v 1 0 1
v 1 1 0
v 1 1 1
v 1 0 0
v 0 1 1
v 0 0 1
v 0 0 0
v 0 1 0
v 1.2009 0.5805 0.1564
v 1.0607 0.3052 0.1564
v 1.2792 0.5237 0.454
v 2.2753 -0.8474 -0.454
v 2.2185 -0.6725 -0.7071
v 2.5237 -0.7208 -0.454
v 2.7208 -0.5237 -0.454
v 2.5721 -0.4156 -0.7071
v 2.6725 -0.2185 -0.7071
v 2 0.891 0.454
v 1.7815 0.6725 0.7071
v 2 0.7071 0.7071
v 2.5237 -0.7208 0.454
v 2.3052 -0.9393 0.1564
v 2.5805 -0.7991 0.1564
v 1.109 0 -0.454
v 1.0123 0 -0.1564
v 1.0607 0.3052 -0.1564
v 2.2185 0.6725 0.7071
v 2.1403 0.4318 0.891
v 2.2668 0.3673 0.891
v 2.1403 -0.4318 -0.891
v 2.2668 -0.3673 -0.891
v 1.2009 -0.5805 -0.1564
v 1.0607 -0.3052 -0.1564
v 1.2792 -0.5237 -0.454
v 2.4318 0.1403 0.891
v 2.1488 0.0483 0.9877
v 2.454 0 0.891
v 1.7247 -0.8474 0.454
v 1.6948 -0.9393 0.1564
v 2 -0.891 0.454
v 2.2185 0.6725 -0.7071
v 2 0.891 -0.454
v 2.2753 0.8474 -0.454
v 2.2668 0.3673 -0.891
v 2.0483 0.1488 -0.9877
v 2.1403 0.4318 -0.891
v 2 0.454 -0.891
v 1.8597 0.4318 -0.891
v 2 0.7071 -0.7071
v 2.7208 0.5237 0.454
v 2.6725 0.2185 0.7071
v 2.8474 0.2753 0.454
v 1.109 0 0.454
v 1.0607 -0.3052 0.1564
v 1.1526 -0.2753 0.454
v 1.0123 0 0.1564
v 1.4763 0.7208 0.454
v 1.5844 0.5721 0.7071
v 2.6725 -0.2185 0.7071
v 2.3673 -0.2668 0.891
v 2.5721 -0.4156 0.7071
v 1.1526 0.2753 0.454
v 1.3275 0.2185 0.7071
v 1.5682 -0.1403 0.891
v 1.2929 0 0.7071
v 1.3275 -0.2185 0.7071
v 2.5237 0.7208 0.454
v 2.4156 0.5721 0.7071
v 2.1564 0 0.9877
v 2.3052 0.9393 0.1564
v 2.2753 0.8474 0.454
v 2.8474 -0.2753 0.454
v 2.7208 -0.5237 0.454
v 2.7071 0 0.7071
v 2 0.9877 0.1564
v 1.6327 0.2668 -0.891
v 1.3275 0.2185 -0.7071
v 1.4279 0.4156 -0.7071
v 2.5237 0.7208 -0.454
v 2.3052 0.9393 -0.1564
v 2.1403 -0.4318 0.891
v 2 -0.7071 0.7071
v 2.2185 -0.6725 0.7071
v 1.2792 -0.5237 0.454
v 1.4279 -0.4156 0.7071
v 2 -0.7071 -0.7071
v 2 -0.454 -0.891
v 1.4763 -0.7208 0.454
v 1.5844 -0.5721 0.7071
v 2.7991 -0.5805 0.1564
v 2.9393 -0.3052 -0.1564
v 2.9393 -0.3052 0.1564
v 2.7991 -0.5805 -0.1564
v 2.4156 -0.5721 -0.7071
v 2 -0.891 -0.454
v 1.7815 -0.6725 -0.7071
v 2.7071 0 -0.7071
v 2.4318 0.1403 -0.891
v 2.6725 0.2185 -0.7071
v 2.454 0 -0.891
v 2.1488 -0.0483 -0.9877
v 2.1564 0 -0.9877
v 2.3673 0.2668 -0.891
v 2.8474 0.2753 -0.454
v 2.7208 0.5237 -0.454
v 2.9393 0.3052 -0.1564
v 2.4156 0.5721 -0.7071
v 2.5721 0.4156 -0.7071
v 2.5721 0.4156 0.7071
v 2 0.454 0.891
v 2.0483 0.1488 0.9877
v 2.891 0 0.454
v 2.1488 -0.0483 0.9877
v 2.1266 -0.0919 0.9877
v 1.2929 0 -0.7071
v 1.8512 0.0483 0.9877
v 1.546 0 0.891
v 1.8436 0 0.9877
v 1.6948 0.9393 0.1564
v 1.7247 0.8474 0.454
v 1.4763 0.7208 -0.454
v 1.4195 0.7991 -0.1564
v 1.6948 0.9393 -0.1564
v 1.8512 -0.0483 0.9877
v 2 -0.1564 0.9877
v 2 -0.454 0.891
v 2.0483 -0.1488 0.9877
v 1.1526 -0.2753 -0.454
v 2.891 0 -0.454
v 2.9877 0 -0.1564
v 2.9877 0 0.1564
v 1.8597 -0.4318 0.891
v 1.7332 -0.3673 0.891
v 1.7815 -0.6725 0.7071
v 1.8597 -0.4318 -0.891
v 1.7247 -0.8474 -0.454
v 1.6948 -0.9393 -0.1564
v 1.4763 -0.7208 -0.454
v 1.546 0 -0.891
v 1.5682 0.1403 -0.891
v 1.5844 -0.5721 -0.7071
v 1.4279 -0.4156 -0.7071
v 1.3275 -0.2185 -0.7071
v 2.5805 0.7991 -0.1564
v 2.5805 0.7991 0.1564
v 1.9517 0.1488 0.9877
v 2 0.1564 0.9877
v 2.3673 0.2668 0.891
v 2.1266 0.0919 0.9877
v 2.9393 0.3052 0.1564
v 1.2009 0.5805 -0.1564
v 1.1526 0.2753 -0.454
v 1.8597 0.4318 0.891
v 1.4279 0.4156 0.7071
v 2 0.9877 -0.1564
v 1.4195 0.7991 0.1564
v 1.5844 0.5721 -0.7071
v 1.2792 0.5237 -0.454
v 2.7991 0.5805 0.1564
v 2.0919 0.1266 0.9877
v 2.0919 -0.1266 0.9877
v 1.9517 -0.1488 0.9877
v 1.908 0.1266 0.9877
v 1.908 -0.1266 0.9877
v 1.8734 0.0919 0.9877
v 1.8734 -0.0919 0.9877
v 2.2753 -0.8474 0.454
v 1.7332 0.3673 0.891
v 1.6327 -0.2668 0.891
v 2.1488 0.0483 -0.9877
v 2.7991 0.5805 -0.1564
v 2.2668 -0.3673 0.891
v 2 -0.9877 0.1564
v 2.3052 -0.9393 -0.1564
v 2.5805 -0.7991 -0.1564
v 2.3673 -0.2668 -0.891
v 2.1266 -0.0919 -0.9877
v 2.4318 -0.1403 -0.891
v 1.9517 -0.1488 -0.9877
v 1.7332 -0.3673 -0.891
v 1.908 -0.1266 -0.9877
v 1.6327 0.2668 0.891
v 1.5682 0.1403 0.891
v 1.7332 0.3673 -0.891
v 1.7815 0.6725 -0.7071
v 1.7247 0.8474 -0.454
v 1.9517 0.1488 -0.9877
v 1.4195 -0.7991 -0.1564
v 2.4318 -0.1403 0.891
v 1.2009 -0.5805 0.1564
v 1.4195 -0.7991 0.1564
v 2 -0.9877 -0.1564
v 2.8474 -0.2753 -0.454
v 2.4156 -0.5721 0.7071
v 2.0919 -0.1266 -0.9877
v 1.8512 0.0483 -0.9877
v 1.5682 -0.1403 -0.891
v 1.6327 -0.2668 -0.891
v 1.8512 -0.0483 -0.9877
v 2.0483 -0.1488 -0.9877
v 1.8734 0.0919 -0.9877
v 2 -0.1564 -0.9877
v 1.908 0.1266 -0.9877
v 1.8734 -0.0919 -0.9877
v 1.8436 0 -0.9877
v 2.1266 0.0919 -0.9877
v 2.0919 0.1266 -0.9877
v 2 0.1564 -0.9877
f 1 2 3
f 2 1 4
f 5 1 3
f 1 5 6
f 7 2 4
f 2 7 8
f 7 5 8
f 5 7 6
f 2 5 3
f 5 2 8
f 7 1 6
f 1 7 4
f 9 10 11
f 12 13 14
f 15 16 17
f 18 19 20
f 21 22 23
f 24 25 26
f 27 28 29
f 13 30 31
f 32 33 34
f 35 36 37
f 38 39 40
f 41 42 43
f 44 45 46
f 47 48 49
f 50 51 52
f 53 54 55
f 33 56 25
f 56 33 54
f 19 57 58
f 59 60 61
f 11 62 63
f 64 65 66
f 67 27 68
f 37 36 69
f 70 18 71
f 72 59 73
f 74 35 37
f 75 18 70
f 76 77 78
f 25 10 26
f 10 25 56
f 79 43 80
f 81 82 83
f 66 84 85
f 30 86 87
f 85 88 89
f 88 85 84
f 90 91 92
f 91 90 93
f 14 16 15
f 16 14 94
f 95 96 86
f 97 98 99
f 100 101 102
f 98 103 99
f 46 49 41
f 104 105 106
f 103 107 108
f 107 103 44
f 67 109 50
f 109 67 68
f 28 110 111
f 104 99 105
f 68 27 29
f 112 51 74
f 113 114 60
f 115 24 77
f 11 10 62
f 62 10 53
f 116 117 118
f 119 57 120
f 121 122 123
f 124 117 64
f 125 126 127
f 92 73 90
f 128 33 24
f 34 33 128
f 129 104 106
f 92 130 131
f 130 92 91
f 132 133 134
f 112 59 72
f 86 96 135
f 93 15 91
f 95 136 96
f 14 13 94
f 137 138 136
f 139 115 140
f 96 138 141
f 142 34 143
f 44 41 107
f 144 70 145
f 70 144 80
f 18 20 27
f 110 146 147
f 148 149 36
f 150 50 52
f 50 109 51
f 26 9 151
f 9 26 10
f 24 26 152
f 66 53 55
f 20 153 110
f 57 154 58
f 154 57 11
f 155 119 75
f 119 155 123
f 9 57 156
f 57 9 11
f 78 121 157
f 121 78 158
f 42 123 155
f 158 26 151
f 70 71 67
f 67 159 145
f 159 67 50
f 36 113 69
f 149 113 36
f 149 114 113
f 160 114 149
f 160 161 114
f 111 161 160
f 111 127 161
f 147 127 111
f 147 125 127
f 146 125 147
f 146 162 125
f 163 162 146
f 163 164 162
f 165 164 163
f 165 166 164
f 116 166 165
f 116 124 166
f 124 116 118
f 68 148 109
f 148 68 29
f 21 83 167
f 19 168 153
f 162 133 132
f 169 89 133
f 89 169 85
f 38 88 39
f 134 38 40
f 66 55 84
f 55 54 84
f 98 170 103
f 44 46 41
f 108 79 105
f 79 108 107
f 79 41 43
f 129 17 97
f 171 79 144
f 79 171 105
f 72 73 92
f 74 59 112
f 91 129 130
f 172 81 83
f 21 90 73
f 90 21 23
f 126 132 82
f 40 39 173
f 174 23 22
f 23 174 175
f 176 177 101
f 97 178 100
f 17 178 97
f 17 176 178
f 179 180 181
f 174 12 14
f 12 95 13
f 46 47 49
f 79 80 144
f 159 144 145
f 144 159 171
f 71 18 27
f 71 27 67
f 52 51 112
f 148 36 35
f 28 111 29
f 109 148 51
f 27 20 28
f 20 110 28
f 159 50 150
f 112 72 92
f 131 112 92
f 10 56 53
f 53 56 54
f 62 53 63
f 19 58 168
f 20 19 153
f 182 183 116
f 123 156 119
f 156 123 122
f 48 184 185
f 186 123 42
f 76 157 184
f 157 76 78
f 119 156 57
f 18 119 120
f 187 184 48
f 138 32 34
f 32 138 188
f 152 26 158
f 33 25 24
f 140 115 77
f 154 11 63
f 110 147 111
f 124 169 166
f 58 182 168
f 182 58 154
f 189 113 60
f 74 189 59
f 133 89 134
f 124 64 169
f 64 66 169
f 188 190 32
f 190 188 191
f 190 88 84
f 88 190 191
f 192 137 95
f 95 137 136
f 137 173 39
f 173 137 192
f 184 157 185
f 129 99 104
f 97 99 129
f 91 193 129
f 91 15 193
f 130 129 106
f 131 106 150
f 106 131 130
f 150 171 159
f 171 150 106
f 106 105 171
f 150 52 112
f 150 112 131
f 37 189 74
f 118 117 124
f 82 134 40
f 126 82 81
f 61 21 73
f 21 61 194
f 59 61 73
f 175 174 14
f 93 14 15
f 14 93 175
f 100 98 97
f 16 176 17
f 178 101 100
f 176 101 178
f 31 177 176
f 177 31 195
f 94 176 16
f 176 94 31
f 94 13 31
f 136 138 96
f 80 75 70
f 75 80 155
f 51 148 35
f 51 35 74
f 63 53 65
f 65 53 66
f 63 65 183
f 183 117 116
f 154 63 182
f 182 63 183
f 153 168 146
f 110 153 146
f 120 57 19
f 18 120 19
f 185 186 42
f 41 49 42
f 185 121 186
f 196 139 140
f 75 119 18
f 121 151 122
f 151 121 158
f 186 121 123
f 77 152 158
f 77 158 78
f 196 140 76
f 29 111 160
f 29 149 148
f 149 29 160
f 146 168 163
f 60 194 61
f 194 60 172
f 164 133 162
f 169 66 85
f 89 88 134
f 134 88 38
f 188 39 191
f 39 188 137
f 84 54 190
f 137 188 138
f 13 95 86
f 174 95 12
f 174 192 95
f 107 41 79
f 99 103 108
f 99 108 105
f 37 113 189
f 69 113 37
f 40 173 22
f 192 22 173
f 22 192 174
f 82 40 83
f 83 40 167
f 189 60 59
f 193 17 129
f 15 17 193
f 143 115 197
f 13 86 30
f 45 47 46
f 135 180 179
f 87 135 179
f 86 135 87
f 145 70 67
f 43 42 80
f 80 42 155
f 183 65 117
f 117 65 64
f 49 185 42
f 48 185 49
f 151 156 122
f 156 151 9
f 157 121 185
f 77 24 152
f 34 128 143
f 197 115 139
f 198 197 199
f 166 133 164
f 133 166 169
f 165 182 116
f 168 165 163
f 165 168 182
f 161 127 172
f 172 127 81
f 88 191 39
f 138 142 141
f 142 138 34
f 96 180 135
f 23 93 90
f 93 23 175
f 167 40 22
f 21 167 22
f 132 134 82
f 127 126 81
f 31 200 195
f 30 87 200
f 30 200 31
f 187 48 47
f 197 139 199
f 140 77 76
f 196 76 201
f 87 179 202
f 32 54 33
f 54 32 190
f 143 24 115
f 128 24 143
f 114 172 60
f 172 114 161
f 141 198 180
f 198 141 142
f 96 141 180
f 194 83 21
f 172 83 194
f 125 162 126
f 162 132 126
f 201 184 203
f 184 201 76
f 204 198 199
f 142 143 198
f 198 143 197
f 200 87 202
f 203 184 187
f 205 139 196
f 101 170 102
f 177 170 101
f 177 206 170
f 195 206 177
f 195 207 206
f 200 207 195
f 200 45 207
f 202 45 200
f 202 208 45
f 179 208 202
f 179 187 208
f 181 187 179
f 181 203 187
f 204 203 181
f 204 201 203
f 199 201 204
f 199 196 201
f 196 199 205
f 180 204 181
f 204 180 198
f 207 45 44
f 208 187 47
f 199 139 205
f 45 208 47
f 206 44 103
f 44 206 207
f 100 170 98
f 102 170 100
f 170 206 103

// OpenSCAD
// source: https://erik.nygren.org/2018-3dprint-multicolor-openscad.html

/* Pick a color below for STL export, or "ALL" to show all colors. */
current_color = "ALL";
//current_color = "Aquamarine";

transparent_aquamarine()
    cube([1, 1, 1]);

orange()
    translate([2, 0, 0])
        sphere(r = 1, $fn=20);

/* Similar to the color function, but can be used for generating multi-color models for printing.
 * The global current_color variable indicates the color to print.
 */
module multicolor(color) {
    if (current_color != "ALL" && current_color != color) { 
        // ignore our children.
    } else {
        color(color)
            children();
    }        
}


module transparent_aquamarine() {
    multicolor("Aquamarine") children();
}

module transparent_light_cyan() {
    multicolor("LightCyan") children();
}

module cyan() {
    multicolor("Cyan") children();
}

module orange() {
    multicolor("DarkOrange") children();
}

module white() {
    multicolor("White") children();
}

module black() {
    multicolor("Black") children();
}
